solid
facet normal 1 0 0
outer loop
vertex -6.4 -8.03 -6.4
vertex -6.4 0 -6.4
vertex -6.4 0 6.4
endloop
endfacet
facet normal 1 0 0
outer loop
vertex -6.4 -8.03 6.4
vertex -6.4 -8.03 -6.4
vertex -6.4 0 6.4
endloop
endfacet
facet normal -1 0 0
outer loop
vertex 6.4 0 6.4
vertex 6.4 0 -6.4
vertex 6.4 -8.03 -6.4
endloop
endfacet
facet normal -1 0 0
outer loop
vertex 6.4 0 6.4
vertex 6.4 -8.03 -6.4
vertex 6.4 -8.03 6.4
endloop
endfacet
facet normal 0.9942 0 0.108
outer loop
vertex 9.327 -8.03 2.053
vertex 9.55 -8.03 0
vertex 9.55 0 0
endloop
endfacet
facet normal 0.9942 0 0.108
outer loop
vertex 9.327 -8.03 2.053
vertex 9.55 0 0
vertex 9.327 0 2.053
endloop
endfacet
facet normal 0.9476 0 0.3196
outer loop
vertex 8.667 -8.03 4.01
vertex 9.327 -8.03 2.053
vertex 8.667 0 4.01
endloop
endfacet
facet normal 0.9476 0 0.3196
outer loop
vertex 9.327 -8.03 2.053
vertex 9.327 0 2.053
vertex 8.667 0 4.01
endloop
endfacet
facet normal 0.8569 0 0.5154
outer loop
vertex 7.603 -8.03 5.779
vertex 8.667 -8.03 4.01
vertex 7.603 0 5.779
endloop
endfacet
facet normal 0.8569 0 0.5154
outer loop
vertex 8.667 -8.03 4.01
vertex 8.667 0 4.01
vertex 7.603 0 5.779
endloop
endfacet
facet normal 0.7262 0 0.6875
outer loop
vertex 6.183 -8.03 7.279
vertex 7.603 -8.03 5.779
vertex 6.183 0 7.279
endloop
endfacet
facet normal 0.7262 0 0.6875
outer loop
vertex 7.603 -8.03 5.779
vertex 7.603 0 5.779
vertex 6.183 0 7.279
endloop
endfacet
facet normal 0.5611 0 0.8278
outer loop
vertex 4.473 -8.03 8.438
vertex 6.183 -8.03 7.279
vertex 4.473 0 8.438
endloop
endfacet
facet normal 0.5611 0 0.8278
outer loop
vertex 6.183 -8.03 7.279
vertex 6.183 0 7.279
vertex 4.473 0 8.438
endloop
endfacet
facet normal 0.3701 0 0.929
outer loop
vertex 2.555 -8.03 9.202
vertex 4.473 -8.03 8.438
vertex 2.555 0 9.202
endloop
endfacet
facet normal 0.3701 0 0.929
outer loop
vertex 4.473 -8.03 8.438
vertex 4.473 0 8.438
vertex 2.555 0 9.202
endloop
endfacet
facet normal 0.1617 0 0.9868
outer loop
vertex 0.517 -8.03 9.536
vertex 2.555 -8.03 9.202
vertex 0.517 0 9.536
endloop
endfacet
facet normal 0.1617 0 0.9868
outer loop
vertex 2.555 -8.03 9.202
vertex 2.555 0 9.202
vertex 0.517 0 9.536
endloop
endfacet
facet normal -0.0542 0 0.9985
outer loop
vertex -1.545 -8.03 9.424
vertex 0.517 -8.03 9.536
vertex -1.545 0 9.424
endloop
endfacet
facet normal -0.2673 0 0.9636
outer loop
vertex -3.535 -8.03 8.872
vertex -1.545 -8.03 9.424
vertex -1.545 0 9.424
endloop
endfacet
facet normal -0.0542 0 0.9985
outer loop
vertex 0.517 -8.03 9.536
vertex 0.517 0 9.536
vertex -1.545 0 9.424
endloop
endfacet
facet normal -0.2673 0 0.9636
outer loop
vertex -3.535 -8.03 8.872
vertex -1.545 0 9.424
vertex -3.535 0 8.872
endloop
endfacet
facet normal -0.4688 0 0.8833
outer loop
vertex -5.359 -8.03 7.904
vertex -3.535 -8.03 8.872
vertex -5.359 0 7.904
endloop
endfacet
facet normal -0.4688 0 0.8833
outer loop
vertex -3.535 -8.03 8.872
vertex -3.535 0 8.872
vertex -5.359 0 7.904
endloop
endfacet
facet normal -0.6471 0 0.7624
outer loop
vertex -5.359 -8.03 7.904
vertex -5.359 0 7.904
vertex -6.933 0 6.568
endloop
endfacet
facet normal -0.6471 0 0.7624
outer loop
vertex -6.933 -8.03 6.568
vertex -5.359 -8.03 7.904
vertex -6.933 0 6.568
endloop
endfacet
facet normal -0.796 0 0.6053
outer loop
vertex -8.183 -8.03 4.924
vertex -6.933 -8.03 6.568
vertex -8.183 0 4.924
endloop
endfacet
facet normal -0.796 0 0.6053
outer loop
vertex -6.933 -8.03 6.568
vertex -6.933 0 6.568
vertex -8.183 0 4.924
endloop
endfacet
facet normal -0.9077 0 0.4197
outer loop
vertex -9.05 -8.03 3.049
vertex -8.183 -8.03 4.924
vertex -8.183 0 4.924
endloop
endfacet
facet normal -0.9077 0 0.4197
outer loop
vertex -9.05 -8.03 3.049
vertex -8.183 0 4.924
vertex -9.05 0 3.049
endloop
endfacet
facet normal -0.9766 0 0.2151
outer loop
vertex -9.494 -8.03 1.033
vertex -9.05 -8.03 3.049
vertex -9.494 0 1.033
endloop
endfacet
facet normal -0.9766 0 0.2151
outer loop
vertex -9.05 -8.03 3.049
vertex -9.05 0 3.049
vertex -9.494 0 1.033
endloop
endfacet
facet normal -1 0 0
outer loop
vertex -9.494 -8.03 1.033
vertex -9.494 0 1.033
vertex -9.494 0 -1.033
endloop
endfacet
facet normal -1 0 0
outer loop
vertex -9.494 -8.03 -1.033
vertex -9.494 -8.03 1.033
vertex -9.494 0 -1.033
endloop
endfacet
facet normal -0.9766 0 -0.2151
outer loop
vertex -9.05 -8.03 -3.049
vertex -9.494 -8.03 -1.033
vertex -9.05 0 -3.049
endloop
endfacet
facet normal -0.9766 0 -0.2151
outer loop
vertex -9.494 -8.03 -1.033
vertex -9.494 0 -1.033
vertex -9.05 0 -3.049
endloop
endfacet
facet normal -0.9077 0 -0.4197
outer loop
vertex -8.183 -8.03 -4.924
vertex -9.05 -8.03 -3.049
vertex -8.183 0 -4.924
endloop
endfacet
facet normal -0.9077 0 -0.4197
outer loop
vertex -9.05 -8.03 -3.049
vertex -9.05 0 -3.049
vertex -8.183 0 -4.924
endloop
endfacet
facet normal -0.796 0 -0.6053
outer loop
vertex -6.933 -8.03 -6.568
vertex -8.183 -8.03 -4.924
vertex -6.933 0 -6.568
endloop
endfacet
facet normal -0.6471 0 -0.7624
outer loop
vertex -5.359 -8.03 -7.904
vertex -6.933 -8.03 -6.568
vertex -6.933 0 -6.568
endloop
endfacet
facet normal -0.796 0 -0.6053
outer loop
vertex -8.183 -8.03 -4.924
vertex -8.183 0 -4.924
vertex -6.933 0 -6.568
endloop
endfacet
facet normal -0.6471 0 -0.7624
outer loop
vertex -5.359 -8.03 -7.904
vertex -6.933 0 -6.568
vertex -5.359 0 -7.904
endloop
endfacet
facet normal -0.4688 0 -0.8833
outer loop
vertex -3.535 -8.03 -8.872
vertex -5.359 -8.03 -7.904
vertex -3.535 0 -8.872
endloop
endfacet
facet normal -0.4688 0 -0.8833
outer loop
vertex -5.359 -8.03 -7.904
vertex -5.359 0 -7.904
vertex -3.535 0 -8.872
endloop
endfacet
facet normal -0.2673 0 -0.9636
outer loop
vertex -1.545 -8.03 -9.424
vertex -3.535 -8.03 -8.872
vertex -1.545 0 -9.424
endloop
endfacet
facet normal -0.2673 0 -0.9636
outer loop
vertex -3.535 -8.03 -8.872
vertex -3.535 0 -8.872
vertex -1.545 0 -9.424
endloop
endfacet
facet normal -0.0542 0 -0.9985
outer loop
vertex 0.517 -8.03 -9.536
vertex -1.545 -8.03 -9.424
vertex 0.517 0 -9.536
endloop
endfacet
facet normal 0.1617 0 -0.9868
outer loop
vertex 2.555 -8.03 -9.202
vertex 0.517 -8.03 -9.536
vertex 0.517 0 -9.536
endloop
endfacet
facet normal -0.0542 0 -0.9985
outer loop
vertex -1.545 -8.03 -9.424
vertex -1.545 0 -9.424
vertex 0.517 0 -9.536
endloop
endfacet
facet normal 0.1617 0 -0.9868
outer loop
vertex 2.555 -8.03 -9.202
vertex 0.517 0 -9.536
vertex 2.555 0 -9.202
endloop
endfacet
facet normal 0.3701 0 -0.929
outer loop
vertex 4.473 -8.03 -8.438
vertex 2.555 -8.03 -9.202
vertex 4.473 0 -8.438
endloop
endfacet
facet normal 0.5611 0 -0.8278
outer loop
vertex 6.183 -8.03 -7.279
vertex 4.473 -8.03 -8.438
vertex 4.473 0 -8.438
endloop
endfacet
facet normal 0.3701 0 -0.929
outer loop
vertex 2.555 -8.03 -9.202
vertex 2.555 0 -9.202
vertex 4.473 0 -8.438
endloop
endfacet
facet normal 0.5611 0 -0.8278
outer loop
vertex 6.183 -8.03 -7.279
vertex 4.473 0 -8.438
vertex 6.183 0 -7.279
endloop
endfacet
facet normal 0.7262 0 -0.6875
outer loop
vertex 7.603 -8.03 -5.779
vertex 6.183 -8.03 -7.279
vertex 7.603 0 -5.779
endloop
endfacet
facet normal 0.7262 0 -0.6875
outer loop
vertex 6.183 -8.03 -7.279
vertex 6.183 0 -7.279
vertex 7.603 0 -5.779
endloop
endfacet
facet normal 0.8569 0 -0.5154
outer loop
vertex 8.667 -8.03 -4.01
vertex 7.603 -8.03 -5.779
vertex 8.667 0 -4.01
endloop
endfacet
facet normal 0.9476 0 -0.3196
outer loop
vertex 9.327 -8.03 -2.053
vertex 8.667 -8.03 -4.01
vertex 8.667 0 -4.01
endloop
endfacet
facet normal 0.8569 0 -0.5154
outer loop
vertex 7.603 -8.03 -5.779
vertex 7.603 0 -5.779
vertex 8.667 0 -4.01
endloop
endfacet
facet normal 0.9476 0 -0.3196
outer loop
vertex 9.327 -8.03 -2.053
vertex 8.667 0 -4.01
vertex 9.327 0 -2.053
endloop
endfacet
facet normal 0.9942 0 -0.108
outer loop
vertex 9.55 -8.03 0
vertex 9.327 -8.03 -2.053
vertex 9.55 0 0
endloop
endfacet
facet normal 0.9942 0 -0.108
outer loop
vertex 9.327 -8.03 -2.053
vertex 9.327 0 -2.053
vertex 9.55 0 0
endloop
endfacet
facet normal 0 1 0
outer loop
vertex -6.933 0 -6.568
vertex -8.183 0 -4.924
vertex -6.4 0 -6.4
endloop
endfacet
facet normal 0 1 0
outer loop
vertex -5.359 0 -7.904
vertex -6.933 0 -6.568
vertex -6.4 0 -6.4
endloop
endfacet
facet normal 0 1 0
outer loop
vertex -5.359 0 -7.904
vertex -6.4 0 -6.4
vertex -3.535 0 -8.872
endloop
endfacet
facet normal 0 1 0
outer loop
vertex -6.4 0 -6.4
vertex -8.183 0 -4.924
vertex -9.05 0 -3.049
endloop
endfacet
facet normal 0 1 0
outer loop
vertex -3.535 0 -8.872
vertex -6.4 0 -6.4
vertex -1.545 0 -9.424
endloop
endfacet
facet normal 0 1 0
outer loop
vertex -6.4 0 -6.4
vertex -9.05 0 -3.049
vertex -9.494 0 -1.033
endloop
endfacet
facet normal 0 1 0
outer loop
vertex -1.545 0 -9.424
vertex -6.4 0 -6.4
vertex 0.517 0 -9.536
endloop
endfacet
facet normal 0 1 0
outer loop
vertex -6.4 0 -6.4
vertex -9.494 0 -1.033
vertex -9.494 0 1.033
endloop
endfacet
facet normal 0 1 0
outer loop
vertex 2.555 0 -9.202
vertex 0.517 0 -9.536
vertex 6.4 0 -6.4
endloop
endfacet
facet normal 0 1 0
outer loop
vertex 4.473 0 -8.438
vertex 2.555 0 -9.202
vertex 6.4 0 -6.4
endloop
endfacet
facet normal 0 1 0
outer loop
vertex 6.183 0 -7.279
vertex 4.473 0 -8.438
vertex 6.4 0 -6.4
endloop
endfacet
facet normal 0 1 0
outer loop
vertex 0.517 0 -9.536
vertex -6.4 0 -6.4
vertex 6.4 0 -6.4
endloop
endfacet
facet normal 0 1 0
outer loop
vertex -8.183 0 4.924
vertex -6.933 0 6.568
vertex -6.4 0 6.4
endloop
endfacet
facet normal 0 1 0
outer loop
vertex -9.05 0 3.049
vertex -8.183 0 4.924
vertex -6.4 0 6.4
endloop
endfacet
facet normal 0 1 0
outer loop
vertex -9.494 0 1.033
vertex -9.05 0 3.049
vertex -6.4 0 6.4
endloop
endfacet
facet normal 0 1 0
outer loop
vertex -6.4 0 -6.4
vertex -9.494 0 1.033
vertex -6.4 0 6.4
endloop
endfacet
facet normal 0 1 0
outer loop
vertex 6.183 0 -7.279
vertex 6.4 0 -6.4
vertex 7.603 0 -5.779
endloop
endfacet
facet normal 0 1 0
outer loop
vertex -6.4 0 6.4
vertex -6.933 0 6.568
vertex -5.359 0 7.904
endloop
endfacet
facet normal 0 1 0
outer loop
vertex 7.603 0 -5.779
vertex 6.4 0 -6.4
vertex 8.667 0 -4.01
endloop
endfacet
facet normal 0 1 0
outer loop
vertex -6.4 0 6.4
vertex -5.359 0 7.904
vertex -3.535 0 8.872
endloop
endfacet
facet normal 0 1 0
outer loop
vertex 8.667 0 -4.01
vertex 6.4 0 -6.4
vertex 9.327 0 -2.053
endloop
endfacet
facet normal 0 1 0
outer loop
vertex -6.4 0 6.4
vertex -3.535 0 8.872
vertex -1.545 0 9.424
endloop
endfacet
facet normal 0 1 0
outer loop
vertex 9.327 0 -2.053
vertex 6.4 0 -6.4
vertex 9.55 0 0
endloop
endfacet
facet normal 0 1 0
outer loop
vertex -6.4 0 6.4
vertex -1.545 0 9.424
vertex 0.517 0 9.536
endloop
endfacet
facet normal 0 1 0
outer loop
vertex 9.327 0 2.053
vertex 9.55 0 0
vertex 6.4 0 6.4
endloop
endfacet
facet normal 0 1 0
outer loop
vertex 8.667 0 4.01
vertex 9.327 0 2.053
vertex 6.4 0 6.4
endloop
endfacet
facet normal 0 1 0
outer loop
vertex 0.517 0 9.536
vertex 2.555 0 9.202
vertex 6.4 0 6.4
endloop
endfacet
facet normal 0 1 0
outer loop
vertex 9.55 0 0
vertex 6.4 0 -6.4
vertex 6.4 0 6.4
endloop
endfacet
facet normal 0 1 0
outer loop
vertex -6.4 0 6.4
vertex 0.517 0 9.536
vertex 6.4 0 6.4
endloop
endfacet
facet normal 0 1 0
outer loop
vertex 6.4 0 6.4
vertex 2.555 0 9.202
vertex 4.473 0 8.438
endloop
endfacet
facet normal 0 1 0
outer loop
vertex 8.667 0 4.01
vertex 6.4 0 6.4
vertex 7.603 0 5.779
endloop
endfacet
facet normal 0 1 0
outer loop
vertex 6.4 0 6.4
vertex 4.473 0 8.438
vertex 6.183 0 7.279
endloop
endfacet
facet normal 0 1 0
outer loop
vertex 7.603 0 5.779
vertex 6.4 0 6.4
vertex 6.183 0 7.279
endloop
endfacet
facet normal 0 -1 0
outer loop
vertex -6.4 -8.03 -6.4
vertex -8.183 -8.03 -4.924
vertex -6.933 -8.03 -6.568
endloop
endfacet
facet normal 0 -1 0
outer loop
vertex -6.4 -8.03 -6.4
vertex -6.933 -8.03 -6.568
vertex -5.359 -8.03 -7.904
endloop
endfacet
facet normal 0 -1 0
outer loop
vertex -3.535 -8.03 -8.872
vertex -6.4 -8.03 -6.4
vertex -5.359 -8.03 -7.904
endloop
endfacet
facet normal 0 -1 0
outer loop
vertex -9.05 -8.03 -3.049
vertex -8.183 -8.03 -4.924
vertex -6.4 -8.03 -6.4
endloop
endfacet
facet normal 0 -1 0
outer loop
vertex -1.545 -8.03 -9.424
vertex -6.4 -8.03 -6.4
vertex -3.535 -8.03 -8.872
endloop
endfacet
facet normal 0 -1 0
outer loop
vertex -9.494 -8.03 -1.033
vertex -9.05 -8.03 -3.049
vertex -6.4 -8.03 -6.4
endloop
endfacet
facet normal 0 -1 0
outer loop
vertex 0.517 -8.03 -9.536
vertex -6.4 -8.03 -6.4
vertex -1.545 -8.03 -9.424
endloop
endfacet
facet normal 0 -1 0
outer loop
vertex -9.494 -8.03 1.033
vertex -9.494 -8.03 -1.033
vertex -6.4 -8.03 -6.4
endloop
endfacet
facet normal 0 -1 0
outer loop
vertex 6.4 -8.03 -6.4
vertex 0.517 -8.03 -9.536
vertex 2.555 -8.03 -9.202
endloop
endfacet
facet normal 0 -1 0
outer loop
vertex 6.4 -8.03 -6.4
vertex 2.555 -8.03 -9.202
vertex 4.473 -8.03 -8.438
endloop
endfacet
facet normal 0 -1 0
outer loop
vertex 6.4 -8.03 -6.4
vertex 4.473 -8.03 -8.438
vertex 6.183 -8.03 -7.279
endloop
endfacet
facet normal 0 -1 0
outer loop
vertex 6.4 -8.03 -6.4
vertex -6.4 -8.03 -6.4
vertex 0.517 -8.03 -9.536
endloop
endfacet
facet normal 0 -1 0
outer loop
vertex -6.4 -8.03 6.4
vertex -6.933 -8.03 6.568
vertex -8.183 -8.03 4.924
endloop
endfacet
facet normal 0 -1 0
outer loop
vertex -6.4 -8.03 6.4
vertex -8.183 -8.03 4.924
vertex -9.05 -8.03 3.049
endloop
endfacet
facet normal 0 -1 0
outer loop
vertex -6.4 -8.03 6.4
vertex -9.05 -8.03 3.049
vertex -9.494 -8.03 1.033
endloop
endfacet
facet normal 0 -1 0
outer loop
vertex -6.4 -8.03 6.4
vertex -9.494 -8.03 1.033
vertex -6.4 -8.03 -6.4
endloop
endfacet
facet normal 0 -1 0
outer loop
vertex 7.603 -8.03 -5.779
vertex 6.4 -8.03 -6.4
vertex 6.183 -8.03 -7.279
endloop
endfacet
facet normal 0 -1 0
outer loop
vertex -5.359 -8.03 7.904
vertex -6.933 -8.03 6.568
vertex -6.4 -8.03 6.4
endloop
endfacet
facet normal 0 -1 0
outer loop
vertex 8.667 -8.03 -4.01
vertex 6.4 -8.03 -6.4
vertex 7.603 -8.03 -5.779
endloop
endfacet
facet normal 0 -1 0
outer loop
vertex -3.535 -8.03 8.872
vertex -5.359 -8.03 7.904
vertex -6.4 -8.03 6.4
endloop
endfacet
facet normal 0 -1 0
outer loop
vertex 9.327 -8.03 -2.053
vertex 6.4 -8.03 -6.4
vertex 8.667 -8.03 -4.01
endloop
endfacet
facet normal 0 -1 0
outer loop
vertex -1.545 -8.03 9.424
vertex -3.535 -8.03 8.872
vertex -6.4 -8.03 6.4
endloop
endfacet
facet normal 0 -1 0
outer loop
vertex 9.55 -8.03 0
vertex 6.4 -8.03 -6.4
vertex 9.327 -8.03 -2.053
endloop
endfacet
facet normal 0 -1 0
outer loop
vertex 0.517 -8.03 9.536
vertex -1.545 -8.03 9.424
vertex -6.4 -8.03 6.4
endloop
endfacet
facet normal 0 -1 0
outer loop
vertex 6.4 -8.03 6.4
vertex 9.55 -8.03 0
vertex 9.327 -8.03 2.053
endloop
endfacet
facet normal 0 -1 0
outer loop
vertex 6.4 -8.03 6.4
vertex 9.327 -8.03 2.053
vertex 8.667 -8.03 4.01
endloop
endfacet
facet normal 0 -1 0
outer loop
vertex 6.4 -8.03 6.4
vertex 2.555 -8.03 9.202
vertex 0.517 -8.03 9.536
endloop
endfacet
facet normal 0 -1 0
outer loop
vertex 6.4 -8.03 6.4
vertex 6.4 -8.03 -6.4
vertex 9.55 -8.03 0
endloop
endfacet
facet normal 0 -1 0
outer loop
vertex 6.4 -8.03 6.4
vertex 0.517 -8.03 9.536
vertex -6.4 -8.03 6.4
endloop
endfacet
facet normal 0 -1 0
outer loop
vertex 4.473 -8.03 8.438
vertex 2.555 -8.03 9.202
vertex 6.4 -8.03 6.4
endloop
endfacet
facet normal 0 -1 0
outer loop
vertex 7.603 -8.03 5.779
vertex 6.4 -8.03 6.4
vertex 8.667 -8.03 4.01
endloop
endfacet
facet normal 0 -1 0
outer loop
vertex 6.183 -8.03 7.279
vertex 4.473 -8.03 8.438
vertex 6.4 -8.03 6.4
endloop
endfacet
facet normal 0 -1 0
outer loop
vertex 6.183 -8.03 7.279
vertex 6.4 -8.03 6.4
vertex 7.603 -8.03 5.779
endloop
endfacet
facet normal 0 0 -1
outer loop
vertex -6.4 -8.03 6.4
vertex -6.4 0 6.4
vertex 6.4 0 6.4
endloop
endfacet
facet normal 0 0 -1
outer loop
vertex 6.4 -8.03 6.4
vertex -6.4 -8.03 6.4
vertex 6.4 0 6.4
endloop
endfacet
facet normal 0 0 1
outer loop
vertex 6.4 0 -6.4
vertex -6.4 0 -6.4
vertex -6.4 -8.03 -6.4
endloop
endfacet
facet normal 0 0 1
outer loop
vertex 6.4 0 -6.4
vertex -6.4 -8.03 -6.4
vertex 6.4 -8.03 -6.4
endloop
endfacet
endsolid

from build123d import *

# Parameters (mm, degrees)
F0_R     = 9.55
F0_W     = 12.8
F0_H     = 12.8
F1_DEPTH = 8.03


with BuildPart() as f1:
    # F0 (on Front) → F1 (new body)
    with BuildSketch(Plane.XZ):
        Circle(F0_R)
        Rectangle(F0_W, F0_H, mode=Mode.SUBTRACT)
    extrude(amount=F1_DEPTH)


solid = f1.part
